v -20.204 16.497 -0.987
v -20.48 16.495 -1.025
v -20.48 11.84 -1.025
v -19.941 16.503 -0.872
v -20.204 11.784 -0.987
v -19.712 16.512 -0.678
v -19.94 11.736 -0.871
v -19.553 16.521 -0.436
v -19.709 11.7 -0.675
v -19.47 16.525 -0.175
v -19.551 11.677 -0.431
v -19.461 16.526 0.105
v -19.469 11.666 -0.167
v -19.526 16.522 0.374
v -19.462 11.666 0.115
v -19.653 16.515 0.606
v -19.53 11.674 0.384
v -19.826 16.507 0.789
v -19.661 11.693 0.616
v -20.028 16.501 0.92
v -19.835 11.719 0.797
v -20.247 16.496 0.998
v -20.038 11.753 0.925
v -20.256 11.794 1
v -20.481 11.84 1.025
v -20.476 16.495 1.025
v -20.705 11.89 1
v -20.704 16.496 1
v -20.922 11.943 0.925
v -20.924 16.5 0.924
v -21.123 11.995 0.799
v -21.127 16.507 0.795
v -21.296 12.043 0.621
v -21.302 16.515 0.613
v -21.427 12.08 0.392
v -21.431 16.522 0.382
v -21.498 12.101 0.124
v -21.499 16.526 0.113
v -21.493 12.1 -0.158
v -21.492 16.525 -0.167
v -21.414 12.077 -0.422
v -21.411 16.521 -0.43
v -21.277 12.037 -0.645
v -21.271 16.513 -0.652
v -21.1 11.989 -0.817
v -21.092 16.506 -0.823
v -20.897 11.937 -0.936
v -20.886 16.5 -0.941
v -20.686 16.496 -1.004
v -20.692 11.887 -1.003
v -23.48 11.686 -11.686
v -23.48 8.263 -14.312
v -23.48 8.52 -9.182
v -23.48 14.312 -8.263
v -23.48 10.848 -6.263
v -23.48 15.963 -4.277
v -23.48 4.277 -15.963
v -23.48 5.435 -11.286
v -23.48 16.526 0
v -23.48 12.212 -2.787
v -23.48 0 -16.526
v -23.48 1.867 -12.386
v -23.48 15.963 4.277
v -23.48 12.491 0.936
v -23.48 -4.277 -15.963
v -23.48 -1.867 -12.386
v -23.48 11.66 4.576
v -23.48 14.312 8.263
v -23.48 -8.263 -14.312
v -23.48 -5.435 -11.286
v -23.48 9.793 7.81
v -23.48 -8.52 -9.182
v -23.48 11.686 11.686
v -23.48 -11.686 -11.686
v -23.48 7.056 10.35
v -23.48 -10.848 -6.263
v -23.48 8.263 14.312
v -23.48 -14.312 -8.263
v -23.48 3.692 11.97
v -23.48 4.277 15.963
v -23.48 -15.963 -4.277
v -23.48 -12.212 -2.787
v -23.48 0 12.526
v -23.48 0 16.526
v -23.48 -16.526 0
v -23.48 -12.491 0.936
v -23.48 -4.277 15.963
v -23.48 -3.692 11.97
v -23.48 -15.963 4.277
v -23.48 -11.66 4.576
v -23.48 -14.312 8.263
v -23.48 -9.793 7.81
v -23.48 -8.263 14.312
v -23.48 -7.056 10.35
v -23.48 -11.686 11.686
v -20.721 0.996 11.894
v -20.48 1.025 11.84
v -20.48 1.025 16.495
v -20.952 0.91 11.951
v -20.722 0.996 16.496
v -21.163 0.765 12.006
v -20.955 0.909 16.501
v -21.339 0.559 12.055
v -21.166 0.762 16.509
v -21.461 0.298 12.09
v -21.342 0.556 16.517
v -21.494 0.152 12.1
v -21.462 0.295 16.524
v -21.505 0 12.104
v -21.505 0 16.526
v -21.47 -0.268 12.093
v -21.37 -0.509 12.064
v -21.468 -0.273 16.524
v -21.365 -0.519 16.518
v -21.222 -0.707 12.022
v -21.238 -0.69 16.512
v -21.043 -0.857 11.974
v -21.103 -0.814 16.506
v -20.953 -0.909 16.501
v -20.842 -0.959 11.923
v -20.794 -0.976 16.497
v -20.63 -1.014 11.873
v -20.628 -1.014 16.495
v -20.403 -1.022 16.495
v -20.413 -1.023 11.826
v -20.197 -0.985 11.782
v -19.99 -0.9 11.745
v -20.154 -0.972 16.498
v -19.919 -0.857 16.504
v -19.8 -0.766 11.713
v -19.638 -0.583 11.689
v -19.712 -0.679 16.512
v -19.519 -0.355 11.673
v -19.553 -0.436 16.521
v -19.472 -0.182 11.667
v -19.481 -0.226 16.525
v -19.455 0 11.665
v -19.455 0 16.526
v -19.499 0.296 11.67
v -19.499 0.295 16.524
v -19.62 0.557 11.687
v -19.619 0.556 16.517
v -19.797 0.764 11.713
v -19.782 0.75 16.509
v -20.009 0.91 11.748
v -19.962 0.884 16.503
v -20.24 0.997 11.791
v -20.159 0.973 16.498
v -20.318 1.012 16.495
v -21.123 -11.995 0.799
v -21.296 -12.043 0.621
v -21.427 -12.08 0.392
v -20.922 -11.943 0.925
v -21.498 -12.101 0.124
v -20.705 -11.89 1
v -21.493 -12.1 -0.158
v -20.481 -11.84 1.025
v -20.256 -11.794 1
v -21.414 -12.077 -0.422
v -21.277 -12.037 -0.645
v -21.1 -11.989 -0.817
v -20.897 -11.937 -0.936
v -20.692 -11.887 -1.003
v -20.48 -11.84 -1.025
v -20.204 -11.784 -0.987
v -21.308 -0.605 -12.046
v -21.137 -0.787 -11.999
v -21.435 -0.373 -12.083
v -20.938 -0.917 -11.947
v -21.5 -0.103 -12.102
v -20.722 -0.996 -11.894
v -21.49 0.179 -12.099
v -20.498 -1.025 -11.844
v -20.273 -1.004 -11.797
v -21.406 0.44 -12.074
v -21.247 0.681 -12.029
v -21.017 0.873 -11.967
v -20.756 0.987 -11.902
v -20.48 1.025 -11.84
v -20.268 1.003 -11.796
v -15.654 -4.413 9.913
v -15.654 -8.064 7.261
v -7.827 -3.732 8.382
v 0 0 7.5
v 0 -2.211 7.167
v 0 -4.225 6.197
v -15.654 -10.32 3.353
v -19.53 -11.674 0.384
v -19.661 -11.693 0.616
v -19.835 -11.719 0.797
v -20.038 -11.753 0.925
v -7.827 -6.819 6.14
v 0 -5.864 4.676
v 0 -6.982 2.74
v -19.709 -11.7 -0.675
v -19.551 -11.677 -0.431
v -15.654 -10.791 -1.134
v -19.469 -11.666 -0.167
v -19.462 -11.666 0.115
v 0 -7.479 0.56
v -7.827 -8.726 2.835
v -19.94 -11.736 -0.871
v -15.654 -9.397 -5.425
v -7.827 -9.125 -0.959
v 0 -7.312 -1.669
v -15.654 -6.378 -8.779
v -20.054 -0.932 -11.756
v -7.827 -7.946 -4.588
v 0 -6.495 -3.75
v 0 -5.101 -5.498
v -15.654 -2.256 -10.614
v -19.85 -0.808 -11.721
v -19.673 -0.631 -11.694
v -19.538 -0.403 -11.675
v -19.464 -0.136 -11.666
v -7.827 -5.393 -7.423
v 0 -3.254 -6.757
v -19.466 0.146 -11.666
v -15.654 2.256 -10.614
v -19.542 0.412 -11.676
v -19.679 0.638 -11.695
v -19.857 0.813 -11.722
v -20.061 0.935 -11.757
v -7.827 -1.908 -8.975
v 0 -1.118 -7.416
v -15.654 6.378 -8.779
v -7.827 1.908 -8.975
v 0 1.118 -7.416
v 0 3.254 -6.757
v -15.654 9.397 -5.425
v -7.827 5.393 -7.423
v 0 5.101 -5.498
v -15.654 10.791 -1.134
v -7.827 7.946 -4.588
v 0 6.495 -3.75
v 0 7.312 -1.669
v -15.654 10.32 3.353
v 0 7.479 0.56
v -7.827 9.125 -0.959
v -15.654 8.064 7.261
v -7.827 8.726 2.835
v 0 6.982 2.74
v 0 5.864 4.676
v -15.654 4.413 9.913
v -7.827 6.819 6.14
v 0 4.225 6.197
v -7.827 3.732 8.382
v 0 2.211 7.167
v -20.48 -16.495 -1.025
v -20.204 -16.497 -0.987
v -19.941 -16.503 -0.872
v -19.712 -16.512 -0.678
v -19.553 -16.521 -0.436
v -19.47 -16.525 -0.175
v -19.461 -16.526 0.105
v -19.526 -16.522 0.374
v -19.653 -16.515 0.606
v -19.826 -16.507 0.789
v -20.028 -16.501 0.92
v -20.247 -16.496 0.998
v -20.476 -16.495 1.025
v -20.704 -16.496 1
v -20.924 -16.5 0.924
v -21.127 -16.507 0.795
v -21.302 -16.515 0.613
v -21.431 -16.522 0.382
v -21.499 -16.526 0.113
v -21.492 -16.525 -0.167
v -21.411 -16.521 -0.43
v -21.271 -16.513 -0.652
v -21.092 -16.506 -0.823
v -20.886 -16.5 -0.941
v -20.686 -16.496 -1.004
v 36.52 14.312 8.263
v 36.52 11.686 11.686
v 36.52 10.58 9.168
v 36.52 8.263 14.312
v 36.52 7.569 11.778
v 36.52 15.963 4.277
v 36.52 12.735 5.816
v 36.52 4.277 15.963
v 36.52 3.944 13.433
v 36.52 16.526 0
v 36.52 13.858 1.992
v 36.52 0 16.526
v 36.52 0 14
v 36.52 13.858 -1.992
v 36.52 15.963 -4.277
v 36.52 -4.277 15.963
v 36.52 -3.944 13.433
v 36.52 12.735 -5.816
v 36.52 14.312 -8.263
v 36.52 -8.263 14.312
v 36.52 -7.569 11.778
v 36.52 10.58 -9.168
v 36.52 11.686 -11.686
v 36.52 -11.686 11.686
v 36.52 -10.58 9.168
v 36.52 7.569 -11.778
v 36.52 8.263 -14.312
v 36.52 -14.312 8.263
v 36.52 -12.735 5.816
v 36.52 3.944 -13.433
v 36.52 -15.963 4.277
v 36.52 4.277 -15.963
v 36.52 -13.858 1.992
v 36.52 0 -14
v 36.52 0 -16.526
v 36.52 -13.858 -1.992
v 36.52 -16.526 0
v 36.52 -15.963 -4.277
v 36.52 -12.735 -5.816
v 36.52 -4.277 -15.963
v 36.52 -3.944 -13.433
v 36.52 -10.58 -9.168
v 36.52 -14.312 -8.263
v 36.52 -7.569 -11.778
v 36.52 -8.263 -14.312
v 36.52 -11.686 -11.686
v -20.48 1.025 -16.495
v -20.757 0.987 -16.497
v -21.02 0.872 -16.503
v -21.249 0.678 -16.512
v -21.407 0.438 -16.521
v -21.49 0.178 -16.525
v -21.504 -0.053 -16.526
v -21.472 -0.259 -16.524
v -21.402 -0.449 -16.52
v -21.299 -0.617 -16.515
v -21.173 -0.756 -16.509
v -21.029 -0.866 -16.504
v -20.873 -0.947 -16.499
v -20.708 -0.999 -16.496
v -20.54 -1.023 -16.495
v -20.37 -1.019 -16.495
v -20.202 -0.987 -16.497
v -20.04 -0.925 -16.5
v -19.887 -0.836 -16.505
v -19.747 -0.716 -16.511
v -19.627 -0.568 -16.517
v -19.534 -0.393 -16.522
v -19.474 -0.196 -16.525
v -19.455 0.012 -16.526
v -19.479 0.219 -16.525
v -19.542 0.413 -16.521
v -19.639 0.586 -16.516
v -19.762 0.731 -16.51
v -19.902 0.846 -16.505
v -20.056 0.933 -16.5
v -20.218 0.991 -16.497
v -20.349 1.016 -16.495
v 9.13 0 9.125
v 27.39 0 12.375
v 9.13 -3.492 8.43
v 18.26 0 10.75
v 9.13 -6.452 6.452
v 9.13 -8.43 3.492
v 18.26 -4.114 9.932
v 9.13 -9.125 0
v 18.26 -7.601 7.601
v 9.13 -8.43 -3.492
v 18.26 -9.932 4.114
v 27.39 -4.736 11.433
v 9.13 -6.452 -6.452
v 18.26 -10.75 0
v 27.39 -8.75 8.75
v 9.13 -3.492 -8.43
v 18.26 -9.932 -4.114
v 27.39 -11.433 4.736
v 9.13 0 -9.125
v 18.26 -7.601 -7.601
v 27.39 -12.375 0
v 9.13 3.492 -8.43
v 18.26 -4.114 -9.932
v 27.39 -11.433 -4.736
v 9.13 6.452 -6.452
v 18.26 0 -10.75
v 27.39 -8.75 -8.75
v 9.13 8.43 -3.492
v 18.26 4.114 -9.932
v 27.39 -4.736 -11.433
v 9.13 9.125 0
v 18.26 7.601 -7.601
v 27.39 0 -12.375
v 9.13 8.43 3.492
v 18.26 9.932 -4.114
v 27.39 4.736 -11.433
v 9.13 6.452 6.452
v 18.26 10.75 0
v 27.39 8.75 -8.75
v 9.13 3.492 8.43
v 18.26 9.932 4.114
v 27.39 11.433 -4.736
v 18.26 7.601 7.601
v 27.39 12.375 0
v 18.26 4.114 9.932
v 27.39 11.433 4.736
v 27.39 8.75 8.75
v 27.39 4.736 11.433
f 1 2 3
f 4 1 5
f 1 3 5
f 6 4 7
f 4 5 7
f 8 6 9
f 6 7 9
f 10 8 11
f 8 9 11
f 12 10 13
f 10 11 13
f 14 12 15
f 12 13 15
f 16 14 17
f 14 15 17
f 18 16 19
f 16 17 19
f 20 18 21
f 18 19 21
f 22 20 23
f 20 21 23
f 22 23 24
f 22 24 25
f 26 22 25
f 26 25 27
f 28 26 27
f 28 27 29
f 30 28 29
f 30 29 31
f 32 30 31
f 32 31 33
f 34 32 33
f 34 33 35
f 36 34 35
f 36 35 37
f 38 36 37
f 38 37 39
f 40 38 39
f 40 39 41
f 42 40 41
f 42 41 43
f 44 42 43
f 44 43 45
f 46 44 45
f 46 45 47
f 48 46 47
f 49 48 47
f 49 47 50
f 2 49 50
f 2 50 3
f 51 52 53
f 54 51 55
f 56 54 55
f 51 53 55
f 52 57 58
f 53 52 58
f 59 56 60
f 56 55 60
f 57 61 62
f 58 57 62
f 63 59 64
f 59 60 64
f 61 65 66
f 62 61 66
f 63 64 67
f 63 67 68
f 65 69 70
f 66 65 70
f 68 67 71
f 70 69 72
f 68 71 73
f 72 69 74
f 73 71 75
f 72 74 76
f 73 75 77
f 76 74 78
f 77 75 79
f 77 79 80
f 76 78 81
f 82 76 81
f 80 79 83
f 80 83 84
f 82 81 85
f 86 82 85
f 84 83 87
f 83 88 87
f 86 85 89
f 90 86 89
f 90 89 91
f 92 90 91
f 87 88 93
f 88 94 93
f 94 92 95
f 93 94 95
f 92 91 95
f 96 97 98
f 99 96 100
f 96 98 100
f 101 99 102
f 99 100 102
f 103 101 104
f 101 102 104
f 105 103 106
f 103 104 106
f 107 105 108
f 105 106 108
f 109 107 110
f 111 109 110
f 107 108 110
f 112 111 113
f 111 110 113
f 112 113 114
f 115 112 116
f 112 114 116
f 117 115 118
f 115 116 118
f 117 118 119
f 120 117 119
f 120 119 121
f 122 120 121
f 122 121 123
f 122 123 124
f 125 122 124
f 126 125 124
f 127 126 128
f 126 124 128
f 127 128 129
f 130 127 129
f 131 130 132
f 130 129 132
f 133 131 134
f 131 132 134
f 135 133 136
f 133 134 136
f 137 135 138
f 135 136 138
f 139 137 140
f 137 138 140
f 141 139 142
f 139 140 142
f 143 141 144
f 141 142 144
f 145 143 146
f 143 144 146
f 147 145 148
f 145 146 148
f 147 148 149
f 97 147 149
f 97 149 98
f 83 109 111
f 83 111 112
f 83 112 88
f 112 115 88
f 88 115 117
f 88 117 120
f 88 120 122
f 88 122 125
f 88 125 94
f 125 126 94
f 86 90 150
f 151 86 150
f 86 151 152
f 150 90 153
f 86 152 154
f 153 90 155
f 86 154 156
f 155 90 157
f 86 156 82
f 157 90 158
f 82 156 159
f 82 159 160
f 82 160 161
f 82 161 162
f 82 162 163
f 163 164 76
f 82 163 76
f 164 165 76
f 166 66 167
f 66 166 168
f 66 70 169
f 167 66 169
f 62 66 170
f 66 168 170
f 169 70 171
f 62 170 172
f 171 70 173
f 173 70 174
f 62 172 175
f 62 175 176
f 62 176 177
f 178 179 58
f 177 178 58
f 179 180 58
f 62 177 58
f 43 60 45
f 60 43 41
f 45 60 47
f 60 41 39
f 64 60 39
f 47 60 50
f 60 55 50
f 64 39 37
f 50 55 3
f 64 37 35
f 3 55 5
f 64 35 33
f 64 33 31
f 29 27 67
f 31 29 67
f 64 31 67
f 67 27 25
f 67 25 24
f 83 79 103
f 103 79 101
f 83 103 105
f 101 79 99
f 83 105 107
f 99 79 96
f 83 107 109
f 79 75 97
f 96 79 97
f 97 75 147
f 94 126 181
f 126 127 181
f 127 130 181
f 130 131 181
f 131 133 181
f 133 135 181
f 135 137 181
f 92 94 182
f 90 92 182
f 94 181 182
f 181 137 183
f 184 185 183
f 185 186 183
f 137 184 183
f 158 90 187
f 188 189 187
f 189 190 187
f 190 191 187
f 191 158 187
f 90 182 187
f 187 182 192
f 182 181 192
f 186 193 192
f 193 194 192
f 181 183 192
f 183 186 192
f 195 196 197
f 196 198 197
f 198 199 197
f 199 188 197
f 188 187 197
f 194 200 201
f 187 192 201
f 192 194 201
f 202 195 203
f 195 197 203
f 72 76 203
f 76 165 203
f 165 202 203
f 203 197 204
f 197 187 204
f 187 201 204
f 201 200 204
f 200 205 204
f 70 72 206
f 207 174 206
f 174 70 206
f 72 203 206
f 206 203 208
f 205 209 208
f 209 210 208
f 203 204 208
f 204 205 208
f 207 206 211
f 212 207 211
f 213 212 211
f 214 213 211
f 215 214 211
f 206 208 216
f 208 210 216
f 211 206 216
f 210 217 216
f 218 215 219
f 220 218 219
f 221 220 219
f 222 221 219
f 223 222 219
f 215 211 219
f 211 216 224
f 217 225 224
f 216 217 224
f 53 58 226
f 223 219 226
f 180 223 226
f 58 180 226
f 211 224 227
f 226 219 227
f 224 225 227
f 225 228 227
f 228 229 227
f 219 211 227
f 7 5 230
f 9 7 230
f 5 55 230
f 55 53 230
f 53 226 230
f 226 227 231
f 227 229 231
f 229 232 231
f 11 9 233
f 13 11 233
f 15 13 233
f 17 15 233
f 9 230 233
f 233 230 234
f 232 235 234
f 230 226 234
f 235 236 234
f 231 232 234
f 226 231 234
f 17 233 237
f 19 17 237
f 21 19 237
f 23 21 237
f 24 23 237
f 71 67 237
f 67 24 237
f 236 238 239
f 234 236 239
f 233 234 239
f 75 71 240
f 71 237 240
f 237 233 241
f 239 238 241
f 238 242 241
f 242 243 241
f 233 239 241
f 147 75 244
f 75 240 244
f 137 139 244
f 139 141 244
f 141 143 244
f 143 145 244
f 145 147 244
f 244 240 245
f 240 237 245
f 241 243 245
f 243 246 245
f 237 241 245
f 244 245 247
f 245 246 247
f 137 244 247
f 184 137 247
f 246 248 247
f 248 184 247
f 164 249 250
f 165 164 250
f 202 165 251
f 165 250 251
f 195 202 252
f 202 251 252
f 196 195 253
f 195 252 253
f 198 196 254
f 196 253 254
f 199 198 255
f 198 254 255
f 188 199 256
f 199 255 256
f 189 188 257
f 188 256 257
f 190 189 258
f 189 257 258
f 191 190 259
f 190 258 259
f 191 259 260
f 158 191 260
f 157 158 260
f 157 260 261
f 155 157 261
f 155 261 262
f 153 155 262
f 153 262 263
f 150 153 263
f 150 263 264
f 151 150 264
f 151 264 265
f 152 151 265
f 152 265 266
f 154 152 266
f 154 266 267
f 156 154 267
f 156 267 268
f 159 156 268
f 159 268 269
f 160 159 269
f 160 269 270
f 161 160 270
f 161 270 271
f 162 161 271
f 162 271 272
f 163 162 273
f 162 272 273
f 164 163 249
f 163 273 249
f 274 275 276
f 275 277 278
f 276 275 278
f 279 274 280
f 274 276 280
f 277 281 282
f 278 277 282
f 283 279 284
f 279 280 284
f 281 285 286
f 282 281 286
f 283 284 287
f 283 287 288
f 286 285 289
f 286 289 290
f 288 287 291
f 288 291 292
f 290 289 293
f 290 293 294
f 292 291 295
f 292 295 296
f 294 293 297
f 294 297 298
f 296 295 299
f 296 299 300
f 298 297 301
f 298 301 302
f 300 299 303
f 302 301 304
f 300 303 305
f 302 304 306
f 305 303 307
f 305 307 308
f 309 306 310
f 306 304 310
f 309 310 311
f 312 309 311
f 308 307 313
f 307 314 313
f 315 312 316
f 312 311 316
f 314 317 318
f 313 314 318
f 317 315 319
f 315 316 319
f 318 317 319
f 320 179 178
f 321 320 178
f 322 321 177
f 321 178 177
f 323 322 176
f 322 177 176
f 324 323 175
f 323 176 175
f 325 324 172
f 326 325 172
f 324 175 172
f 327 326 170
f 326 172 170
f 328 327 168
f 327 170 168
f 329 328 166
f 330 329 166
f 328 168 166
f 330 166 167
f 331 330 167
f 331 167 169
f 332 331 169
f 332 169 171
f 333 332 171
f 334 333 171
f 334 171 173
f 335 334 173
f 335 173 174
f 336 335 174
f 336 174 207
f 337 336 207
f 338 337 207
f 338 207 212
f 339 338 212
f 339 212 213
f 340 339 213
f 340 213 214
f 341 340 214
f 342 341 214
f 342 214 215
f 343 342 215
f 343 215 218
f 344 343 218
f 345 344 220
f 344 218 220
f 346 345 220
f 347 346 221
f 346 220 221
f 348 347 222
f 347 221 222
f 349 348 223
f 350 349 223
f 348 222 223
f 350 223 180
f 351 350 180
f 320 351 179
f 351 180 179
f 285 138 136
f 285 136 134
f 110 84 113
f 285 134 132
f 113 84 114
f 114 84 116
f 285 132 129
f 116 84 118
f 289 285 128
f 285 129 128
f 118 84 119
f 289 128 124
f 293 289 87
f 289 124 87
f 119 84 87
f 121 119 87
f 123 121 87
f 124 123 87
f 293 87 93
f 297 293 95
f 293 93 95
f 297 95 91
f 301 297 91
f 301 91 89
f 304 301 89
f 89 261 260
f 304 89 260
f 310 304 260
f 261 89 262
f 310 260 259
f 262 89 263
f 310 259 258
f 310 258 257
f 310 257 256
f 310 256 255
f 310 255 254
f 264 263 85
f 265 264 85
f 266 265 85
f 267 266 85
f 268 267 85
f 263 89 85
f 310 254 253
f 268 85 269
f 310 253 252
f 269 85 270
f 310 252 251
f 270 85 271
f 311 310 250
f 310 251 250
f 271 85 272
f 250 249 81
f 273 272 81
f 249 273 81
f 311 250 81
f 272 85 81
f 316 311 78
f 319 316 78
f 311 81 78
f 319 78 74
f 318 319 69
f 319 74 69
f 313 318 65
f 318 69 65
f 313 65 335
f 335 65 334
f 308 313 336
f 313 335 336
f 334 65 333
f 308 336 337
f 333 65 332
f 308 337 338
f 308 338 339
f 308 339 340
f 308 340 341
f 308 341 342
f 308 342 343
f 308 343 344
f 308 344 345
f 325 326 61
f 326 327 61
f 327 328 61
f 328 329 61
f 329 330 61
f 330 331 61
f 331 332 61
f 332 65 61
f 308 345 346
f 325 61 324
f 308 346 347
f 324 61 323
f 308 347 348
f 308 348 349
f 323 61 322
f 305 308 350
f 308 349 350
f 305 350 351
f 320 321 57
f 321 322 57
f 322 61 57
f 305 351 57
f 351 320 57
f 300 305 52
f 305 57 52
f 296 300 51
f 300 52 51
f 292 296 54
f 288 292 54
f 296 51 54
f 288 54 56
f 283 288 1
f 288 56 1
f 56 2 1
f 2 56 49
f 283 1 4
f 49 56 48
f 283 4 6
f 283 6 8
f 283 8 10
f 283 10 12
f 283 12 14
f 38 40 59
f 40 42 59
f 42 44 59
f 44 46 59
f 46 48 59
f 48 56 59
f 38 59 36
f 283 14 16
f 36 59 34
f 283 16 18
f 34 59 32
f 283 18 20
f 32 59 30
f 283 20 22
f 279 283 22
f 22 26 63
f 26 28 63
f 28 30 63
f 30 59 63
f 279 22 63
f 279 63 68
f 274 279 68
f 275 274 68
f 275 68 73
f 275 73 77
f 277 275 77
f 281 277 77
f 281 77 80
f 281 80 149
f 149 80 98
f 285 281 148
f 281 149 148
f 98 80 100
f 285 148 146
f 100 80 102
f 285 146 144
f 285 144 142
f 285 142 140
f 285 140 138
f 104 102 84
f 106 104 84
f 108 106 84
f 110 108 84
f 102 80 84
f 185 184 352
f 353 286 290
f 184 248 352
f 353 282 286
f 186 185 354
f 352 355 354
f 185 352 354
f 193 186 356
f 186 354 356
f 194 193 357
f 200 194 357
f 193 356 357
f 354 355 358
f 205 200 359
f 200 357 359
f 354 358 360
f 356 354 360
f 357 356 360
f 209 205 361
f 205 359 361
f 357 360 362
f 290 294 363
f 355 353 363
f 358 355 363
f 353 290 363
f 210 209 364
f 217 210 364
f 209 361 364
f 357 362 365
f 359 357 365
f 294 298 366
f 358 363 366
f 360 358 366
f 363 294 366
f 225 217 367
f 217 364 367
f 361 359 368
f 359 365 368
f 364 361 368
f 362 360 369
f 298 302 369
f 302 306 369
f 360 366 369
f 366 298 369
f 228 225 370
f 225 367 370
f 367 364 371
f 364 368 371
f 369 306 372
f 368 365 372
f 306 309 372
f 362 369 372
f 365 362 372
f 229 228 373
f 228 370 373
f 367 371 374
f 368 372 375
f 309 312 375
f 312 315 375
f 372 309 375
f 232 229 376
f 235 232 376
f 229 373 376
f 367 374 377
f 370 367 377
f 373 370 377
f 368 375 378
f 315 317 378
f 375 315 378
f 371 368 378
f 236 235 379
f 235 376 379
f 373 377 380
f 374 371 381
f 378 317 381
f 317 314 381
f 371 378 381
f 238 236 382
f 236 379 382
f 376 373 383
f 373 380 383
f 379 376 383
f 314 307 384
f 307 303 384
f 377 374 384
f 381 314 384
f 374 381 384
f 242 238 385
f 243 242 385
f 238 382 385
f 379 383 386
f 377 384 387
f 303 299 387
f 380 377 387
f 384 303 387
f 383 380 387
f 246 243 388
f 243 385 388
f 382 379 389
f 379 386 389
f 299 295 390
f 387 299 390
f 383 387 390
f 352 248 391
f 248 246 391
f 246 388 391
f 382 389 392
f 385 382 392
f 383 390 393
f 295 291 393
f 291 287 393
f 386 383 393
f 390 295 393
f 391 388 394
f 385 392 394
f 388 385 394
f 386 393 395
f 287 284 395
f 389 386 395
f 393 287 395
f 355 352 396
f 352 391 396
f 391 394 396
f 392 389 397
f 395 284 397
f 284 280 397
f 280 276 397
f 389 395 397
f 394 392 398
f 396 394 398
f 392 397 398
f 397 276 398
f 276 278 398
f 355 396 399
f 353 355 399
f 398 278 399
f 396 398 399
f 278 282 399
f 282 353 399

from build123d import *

# Parameters (mm, degrees)
M2_5_TAPPED_HOLE1_D           = 2.05
M2_5_TAPPED_HOLE1_ON_FACE_2_D = 2.05


with BuildPart() as part:
    # Sketch1 → Revolve1 (revolve)
    with BuildSketch(Plane.XY, mode=Mode.PRIVATE) as revolve1_sk:
        Polygon((0, 7.5), (36.519586152, 14), (36.519586152, 16.526331), (-23.480413848, 16.526331), (-23.480413848, 12.526331), align=None)
    revolve(revolve1_sk.sketch.rotate(Axis((-21.926609295, 0, 0), (1, 0, 0)), 90), axis=Axis((-21.926609295, 0, 0), (1, 0, 0)))

    # M2.5 Tapped Hole1 (through all)
    with Locations(Plane(origin=(-20.480413848, 0, -16.526331), x_dir=(0, -1, 0), z_dir=(0, 0, -1))):
        with Locations((0, 0)):
            Hole(M2_5_TAPPED_HOLE1_D / 2)

    # M2.5 Tapped Hole1 on face 2 (through all)
    with Locations(Plane(origin=(-20.480413848, 16.526331, 0), x_dir=(0, 0, 1), z_dir=(0, 1, 0))):
        with Locations((0, 0)):
            Hole(M2_5_TAPPED_HOLE1_ON_FACE_2_D / 2)


solid = part.part
